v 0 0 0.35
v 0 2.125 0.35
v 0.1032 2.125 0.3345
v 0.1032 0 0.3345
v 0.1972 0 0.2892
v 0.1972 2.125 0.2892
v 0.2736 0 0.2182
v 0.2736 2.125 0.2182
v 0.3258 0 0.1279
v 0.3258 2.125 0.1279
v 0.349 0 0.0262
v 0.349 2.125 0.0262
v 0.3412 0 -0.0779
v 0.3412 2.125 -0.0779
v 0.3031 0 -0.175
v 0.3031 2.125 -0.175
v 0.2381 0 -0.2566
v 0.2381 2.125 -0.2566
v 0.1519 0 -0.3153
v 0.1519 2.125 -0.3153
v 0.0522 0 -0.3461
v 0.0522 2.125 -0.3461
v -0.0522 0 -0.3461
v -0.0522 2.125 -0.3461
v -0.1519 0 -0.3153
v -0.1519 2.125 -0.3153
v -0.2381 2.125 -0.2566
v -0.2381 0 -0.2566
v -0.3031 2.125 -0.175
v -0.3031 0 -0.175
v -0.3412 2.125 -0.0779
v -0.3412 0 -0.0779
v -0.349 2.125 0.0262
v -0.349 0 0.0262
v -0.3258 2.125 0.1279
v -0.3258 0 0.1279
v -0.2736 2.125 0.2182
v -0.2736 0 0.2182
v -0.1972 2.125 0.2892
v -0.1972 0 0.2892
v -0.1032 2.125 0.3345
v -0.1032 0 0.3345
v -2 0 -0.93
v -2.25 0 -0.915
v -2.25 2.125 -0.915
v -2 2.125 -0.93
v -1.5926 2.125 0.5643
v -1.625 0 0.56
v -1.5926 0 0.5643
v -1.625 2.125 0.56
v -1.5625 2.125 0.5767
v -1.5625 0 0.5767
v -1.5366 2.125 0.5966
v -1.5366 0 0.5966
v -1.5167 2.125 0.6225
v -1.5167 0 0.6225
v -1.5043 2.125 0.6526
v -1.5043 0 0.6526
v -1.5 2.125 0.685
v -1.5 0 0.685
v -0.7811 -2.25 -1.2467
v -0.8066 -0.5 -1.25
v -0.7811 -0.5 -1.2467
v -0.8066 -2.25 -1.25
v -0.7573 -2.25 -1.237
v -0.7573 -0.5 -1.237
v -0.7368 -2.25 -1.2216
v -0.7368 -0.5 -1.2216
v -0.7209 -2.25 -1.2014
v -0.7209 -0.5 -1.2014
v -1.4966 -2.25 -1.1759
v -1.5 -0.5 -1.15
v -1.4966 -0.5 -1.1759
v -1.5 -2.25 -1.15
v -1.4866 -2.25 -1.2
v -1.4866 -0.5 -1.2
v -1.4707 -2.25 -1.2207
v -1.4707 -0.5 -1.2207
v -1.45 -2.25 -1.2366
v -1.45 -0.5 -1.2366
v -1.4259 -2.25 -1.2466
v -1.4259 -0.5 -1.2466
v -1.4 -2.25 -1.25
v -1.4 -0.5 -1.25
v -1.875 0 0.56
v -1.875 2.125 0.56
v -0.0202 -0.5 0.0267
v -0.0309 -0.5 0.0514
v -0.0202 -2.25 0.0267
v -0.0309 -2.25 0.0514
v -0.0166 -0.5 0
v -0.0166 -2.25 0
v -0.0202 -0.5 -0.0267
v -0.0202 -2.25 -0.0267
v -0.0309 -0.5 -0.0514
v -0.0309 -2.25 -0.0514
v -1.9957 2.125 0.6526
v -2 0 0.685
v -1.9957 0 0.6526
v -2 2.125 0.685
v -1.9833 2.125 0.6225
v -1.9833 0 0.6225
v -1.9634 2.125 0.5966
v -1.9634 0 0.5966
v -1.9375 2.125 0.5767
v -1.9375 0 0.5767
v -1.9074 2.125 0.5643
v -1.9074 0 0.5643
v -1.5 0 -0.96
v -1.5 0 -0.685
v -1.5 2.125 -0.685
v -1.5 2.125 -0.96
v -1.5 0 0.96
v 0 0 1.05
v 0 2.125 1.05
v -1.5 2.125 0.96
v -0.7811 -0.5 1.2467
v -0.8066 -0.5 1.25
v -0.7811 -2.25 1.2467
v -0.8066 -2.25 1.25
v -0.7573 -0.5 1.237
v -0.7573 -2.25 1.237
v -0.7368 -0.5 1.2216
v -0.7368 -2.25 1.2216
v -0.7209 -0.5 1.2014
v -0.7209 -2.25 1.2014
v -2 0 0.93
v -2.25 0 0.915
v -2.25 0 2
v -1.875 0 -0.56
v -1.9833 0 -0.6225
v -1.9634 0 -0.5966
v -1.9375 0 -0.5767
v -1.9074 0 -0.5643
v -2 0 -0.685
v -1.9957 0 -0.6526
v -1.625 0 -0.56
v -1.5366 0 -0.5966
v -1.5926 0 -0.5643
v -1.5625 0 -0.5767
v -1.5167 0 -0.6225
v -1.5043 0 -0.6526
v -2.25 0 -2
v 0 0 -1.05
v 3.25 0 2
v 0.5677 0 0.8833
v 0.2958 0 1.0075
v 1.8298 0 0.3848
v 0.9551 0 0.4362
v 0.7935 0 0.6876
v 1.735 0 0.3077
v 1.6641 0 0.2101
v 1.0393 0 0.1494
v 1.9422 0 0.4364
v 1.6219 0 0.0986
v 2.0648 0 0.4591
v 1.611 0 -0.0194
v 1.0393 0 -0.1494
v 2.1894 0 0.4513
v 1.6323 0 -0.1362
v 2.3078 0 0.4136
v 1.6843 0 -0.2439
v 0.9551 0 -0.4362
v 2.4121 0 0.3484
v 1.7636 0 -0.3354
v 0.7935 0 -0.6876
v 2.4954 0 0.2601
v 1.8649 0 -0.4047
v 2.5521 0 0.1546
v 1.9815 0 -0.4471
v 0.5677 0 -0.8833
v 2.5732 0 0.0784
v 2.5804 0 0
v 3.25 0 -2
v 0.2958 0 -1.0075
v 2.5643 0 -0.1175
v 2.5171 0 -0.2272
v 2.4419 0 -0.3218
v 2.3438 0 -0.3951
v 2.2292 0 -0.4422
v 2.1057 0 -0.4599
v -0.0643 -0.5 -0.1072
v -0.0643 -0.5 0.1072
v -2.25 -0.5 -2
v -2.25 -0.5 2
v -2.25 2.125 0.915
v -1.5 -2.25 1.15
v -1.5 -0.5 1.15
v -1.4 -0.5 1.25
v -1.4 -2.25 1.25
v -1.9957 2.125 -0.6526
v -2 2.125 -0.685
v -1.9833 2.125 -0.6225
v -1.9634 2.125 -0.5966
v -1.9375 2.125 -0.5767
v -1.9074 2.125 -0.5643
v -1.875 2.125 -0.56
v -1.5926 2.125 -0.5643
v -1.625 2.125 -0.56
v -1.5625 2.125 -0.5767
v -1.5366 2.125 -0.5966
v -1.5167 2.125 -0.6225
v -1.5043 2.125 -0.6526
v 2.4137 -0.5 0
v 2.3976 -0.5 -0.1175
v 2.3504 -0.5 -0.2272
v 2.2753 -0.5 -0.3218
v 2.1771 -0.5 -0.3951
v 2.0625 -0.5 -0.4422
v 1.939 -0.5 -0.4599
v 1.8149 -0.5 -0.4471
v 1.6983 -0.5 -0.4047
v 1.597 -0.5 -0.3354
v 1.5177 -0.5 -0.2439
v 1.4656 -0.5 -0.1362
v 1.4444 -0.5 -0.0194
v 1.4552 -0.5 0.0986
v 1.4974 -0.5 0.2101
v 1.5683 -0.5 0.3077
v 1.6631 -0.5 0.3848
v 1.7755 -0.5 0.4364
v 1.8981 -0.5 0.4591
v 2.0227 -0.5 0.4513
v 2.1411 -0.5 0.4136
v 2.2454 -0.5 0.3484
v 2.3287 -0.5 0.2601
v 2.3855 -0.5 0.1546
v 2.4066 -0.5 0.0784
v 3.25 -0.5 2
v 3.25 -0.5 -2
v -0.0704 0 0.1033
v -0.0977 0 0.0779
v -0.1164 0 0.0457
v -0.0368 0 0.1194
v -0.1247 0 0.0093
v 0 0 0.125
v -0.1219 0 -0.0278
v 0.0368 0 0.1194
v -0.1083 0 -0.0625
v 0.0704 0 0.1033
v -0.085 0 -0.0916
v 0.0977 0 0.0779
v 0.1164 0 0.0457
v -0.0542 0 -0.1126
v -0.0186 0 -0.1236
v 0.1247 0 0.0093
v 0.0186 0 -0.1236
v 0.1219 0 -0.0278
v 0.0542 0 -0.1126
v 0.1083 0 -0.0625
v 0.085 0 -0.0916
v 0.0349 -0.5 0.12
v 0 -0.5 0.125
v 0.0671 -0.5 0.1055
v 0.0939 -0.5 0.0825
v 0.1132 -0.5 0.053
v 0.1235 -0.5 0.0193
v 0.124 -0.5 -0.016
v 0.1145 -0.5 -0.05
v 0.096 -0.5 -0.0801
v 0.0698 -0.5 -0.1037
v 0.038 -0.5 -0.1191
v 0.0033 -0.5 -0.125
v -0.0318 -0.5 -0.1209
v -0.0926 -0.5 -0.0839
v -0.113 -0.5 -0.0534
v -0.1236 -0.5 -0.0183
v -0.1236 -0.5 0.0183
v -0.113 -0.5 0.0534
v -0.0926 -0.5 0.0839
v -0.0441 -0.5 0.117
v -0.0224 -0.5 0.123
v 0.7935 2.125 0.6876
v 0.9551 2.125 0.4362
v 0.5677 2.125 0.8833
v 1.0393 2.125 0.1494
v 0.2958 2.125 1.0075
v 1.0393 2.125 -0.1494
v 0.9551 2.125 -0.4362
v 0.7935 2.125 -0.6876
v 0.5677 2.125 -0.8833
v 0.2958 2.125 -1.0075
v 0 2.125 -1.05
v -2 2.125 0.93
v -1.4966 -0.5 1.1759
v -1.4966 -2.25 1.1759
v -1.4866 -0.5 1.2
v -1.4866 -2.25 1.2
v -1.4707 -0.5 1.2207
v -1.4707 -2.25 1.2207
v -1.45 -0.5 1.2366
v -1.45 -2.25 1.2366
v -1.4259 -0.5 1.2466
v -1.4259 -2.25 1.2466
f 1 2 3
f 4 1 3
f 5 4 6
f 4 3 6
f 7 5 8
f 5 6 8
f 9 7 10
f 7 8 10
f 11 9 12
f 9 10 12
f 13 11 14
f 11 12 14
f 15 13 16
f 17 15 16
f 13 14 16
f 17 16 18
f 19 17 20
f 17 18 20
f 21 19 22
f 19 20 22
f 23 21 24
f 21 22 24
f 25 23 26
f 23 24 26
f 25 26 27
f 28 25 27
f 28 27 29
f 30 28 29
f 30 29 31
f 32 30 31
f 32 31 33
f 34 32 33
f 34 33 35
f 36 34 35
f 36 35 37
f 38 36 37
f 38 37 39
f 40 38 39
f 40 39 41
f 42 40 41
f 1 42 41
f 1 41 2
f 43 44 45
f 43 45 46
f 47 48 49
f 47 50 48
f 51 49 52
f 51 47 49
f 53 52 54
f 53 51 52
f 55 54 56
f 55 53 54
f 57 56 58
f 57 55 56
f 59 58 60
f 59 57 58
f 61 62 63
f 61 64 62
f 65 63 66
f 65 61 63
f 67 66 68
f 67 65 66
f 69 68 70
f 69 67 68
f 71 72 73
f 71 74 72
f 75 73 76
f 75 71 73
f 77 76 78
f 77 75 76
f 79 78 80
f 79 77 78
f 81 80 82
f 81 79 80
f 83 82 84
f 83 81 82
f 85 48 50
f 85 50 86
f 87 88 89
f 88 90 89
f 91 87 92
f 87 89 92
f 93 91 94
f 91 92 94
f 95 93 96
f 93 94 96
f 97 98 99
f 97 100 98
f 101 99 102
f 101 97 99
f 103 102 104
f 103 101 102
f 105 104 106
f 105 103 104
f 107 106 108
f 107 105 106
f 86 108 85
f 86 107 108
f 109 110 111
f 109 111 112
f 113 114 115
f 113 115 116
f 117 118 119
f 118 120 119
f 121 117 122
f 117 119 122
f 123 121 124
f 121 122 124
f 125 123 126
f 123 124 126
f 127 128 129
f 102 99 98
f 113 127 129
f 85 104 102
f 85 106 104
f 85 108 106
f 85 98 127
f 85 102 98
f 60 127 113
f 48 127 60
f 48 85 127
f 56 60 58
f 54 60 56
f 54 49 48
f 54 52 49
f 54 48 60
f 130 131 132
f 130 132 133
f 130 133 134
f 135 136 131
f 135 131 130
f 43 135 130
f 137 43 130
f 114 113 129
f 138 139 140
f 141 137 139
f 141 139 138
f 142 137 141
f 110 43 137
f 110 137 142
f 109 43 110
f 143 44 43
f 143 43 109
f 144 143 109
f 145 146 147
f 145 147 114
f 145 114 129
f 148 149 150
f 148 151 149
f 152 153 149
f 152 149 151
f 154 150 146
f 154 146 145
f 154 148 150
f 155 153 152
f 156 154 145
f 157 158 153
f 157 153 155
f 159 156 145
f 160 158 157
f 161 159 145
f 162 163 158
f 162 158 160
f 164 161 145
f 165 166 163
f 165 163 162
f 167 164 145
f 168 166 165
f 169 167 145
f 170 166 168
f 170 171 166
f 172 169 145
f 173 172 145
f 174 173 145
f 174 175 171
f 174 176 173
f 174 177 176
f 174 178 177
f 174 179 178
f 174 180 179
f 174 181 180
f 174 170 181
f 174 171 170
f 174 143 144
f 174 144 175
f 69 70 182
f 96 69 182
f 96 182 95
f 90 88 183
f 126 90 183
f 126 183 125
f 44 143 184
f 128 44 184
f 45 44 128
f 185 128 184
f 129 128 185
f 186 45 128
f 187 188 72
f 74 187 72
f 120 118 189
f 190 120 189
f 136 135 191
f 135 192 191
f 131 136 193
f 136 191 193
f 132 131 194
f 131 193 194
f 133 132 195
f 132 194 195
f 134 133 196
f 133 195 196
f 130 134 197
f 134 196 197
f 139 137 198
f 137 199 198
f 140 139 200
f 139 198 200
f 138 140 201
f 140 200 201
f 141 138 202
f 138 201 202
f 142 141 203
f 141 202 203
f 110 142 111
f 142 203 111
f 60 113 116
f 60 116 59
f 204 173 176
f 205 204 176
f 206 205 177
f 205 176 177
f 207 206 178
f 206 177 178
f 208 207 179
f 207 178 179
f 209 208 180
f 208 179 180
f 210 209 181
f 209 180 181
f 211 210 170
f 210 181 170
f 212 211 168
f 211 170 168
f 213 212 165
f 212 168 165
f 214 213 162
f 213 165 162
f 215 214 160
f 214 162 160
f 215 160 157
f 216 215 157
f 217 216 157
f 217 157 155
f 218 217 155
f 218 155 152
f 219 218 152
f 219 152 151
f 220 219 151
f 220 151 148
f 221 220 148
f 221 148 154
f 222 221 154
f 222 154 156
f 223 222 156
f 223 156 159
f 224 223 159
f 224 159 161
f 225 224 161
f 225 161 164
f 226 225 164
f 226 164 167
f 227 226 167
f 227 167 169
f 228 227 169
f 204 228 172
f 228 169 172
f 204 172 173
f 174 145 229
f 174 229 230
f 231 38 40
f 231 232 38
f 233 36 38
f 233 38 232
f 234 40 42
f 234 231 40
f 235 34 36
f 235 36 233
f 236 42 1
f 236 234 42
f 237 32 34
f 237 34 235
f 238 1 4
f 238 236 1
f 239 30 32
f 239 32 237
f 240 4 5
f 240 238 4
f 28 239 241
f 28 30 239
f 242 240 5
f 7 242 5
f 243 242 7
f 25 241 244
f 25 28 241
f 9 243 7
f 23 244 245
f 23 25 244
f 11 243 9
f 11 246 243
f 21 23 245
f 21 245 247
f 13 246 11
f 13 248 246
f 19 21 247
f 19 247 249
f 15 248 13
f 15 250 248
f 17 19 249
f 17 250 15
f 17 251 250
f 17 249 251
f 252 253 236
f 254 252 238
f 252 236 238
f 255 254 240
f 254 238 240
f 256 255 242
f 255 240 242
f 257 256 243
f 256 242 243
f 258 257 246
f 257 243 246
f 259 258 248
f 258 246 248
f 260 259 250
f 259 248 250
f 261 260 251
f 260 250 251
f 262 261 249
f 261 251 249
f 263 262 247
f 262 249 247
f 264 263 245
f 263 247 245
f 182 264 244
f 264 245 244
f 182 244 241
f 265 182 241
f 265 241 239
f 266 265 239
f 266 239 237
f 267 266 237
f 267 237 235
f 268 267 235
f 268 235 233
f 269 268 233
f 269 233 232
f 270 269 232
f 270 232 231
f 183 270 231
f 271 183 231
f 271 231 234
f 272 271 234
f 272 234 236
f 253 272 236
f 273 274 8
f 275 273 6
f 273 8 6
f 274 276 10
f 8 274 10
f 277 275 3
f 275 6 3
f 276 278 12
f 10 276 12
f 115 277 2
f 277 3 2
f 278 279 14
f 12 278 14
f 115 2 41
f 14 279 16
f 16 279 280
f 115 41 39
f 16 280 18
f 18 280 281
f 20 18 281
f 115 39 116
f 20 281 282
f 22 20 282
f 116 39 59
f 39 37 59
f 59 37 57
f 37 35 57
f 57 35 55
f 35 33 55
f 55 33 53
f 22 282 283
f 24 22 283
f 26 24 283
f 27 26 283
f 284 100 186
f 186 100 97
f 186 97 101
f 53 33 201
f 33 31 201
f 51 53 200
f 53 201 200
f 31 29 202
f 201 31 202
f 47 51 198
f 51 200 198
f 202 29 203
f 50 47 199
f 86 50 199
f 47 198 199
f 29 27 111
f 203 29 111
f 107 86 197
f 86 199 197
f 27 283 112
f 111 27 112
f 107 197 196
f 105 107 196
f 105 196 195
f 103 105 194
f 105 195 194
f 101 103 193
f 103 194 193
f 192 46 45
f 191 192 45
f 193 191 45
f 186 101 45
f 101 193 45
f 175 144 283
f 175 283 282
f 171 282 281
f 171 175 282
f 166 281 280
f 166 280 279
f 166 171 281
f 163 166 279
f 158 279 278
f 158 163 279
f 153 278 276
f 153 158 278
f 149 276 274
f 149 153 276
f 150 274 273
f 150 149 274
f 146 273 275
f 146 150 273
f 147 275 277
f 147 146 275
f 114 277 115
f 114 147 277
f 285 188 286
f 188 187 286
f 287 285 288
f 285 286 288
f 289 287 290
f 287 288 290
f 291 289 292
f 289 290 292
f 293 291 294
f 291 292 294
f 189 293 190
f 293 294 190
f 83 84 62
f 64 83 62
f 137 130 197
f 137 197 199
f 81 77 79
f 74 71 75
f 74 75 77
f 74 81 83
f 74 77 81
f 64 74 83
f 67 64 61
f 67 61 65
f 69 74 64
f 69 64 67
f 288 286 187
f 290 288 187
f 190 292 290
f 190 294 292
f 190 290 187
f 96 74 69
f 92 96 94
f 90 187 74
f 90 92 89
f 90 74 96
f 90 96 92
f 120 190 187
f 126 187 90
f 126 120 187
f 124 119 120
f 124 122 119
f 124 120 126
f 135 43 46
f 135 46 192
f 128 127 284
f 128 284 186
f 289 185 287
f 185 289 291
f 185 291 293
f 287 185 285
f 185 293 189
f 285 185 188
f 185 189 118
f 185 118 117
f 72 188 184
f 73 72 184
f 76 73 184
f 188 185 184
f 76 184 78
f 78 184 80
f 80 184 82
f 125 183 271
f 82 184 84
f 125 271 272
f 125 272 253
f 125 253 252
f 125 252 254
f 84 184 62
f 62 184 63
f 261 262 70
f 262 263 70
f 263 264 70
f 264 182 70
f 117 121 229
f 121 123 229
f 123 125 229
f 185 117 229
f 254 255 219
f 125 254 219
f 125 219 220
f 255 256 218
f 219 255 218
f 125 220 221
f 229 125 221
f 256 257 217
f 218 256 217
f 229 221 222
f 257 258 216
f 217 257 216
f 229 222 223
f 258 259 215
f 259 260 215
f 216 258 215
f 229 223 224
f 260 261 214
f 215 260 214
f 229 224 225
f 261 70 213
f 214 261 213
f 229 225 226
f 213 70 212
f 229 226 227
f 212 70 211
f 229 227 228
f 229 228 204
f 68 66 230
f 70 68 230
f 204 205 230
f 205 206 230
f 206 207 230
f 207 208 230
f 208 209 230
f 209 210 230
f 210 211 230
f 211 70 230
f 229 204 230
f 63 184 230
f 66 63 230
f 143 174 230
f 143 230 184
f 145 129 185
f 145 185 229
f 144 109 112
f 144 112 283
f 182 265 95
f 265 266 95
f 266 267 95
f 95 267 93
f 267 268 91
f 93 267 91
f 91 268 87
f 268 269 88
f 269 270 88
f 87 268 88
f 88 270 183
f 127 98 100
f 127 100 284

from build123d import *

# Parameters (mm, degrees)
BOSS_EXTRUDE1_DEPTH     = 2.125
SKETCH4_R               = 0.35
THROUGH_HOLES_DEPTH     = 4.445014514
FILLET1_R               = 0.125
SKETCH5_R               = 0.125
BOSS_EXTRUDE2_DEPTH     = 0.5
SKETCH8_R               = 0.46
CUT_EXTRUDE1_DEPTH      = 5.582575695
CUT_EXTRUDE2_DEPTH      = 5.367851302
CUT_EXTRUDE2_DEPTH_BACK = 5.367851302
SKETCH9_W               = 1.465031661
SKETCH9_H               = 4
BOSS_EXTRUDE3_DEPTH     = 1.75
FILLET2_R               = 0.1


with BuildPart() as part:
    # Sketch3 → Boss-Extrude1 (new body)
    with BuildSketch(Plane(origin=(0, 0, 0), x_dir=(1, 0, 0), z_dir=(0, 1, 0))):
        with BuildLine():
            Line((-2.5, 0.9), (-2, 0.93))
            Line((-2, 0.93), (-2, 0.56))
            Line((-2, 0.56), (-1.5, 0.56))
            Line((-1.5, 0.56), (-1.5, 0.96))
            Line((-1.5, 0.96), (0, 1.05))
            ThreePointArc((0, 1.05), (1.05, 0), (0, -1.05))
            Line((0, -1.05), (-1.5, -0.96))
            Line((-1.5, -0.96), (-1.5, -0.56))
            Line((-1.5, -0.56), (-2, -0.56))
            Line((-2, -0.56), (-2, -0.93))
            Line((-2, -0.93), (-2.5, -0.9))
            Line((-2.5, -0.9), (-2.5, 0.9))
        make_face()
    extrude(amount=BOSS_EXTRUDE1_DEPTH)

    # Sketch4 → Through Holes (cut, through all)
    with BuildSketch(Plane(origin=(0, 2.125, 0), x_dir=(1, 0, 0), z_dir=(0, 1, 0))):
        with Locations(Location((0, 0, 0), (0, 0, 270))):
            Circle(SKETCH4_R)
    extrude(amount=-THROUGH_HOLES_DEPTH, mode=Mode.SUBTRACT)

    # Fillet1
    fillet1_edges = [part.edges().sort_by_distance(p)[0] for p in [
        (-2, 1.0625, -0.56),
        (-1.5, 1.0625, -0.56),
        (-1.5, 1.0625, 0.56),
        (-2, 1.0625, 0.56),
    ]]
    fillet(fillet1_edges, radius=FILLET1_R)

    # Sketch5 → Boss-Extrude2 (add)
    with BuildSketch(Plane(origin=(0, 0, 0), x_dir=(1, 0, 0), z_dir=(0, 1, 0))):
        Polygon((-2.25, -2), (1.75, -2), (3.25, -2), (3.25, 2), (1.75, 2), (-2.25, 2), align=None)
        with Locations(Location((0, 0, 0), (0, 0, 270))):
            Circle(SKETCH5_R, mode=Mode.SUBTRACT)
    extrude(amount=-BOSS_EXTRUDE2_DEPTH)

    # Sketch8 → Cut-Extrude1 (cut, through all)
    with BuildSketch(Plane(origin=(0.7, 2.1, 0), x_dir=(0.948683298050514, -0.3162277660168378, 0), z_dir=(0.3162277660168378, 0.948683298050514, 0))):
        with Locations((1.987936011, 0)):
            Circle(SKETCH8_R)
    extrude(amount=-CUT_EXTRUDE1_DEPTH, mode=Mode.SUBTRACT)

    # Sketch9 → Cut-Extrude2 (cut, two sides: drawn at the far end of the back side and taken through both)
    with BuildSketch(Plane.XZ.offset(-CUT_EXTRUDE2_DEPTH_BACK)):
        with Locations((-2.982515831, 0)):
            Rectangle(SKETCH9_W, SKETCH9_H)
    extrude(amount=CUT_EXTRUDE2_DEPTH + CUT_EXTRUDE2_DEPTH_BACK, mode=Mode.SUBTRACT)

    # Sketch10 → Boss-Extrude3 (add)
    with BuildSketch(Plane.XZ.offset(0.5)):
        Polygon((-1.5, 1.25), (-1.5, -1.25), (-0.75, -1.25), (0, 0), (-0.75, 1.25), align=None)
    extrude(amount=BOSS_EXTRUDE3_DEPTH)

    # Fillet2
    fillet2_edges = [part.edges().sort_by_distance(p)[0] for p in [
        (-0.75, -1.375, 1.25),
        (-1.5, -1.375, 1.25),
        (-1.5, -1.375, -1.25),
        (-0.75, -1.375, -1.25),
        (0, -1.375, 0),
    ]]
    fillet(fillet2_edges, radius=FILLET2_R)


solid = part.part
